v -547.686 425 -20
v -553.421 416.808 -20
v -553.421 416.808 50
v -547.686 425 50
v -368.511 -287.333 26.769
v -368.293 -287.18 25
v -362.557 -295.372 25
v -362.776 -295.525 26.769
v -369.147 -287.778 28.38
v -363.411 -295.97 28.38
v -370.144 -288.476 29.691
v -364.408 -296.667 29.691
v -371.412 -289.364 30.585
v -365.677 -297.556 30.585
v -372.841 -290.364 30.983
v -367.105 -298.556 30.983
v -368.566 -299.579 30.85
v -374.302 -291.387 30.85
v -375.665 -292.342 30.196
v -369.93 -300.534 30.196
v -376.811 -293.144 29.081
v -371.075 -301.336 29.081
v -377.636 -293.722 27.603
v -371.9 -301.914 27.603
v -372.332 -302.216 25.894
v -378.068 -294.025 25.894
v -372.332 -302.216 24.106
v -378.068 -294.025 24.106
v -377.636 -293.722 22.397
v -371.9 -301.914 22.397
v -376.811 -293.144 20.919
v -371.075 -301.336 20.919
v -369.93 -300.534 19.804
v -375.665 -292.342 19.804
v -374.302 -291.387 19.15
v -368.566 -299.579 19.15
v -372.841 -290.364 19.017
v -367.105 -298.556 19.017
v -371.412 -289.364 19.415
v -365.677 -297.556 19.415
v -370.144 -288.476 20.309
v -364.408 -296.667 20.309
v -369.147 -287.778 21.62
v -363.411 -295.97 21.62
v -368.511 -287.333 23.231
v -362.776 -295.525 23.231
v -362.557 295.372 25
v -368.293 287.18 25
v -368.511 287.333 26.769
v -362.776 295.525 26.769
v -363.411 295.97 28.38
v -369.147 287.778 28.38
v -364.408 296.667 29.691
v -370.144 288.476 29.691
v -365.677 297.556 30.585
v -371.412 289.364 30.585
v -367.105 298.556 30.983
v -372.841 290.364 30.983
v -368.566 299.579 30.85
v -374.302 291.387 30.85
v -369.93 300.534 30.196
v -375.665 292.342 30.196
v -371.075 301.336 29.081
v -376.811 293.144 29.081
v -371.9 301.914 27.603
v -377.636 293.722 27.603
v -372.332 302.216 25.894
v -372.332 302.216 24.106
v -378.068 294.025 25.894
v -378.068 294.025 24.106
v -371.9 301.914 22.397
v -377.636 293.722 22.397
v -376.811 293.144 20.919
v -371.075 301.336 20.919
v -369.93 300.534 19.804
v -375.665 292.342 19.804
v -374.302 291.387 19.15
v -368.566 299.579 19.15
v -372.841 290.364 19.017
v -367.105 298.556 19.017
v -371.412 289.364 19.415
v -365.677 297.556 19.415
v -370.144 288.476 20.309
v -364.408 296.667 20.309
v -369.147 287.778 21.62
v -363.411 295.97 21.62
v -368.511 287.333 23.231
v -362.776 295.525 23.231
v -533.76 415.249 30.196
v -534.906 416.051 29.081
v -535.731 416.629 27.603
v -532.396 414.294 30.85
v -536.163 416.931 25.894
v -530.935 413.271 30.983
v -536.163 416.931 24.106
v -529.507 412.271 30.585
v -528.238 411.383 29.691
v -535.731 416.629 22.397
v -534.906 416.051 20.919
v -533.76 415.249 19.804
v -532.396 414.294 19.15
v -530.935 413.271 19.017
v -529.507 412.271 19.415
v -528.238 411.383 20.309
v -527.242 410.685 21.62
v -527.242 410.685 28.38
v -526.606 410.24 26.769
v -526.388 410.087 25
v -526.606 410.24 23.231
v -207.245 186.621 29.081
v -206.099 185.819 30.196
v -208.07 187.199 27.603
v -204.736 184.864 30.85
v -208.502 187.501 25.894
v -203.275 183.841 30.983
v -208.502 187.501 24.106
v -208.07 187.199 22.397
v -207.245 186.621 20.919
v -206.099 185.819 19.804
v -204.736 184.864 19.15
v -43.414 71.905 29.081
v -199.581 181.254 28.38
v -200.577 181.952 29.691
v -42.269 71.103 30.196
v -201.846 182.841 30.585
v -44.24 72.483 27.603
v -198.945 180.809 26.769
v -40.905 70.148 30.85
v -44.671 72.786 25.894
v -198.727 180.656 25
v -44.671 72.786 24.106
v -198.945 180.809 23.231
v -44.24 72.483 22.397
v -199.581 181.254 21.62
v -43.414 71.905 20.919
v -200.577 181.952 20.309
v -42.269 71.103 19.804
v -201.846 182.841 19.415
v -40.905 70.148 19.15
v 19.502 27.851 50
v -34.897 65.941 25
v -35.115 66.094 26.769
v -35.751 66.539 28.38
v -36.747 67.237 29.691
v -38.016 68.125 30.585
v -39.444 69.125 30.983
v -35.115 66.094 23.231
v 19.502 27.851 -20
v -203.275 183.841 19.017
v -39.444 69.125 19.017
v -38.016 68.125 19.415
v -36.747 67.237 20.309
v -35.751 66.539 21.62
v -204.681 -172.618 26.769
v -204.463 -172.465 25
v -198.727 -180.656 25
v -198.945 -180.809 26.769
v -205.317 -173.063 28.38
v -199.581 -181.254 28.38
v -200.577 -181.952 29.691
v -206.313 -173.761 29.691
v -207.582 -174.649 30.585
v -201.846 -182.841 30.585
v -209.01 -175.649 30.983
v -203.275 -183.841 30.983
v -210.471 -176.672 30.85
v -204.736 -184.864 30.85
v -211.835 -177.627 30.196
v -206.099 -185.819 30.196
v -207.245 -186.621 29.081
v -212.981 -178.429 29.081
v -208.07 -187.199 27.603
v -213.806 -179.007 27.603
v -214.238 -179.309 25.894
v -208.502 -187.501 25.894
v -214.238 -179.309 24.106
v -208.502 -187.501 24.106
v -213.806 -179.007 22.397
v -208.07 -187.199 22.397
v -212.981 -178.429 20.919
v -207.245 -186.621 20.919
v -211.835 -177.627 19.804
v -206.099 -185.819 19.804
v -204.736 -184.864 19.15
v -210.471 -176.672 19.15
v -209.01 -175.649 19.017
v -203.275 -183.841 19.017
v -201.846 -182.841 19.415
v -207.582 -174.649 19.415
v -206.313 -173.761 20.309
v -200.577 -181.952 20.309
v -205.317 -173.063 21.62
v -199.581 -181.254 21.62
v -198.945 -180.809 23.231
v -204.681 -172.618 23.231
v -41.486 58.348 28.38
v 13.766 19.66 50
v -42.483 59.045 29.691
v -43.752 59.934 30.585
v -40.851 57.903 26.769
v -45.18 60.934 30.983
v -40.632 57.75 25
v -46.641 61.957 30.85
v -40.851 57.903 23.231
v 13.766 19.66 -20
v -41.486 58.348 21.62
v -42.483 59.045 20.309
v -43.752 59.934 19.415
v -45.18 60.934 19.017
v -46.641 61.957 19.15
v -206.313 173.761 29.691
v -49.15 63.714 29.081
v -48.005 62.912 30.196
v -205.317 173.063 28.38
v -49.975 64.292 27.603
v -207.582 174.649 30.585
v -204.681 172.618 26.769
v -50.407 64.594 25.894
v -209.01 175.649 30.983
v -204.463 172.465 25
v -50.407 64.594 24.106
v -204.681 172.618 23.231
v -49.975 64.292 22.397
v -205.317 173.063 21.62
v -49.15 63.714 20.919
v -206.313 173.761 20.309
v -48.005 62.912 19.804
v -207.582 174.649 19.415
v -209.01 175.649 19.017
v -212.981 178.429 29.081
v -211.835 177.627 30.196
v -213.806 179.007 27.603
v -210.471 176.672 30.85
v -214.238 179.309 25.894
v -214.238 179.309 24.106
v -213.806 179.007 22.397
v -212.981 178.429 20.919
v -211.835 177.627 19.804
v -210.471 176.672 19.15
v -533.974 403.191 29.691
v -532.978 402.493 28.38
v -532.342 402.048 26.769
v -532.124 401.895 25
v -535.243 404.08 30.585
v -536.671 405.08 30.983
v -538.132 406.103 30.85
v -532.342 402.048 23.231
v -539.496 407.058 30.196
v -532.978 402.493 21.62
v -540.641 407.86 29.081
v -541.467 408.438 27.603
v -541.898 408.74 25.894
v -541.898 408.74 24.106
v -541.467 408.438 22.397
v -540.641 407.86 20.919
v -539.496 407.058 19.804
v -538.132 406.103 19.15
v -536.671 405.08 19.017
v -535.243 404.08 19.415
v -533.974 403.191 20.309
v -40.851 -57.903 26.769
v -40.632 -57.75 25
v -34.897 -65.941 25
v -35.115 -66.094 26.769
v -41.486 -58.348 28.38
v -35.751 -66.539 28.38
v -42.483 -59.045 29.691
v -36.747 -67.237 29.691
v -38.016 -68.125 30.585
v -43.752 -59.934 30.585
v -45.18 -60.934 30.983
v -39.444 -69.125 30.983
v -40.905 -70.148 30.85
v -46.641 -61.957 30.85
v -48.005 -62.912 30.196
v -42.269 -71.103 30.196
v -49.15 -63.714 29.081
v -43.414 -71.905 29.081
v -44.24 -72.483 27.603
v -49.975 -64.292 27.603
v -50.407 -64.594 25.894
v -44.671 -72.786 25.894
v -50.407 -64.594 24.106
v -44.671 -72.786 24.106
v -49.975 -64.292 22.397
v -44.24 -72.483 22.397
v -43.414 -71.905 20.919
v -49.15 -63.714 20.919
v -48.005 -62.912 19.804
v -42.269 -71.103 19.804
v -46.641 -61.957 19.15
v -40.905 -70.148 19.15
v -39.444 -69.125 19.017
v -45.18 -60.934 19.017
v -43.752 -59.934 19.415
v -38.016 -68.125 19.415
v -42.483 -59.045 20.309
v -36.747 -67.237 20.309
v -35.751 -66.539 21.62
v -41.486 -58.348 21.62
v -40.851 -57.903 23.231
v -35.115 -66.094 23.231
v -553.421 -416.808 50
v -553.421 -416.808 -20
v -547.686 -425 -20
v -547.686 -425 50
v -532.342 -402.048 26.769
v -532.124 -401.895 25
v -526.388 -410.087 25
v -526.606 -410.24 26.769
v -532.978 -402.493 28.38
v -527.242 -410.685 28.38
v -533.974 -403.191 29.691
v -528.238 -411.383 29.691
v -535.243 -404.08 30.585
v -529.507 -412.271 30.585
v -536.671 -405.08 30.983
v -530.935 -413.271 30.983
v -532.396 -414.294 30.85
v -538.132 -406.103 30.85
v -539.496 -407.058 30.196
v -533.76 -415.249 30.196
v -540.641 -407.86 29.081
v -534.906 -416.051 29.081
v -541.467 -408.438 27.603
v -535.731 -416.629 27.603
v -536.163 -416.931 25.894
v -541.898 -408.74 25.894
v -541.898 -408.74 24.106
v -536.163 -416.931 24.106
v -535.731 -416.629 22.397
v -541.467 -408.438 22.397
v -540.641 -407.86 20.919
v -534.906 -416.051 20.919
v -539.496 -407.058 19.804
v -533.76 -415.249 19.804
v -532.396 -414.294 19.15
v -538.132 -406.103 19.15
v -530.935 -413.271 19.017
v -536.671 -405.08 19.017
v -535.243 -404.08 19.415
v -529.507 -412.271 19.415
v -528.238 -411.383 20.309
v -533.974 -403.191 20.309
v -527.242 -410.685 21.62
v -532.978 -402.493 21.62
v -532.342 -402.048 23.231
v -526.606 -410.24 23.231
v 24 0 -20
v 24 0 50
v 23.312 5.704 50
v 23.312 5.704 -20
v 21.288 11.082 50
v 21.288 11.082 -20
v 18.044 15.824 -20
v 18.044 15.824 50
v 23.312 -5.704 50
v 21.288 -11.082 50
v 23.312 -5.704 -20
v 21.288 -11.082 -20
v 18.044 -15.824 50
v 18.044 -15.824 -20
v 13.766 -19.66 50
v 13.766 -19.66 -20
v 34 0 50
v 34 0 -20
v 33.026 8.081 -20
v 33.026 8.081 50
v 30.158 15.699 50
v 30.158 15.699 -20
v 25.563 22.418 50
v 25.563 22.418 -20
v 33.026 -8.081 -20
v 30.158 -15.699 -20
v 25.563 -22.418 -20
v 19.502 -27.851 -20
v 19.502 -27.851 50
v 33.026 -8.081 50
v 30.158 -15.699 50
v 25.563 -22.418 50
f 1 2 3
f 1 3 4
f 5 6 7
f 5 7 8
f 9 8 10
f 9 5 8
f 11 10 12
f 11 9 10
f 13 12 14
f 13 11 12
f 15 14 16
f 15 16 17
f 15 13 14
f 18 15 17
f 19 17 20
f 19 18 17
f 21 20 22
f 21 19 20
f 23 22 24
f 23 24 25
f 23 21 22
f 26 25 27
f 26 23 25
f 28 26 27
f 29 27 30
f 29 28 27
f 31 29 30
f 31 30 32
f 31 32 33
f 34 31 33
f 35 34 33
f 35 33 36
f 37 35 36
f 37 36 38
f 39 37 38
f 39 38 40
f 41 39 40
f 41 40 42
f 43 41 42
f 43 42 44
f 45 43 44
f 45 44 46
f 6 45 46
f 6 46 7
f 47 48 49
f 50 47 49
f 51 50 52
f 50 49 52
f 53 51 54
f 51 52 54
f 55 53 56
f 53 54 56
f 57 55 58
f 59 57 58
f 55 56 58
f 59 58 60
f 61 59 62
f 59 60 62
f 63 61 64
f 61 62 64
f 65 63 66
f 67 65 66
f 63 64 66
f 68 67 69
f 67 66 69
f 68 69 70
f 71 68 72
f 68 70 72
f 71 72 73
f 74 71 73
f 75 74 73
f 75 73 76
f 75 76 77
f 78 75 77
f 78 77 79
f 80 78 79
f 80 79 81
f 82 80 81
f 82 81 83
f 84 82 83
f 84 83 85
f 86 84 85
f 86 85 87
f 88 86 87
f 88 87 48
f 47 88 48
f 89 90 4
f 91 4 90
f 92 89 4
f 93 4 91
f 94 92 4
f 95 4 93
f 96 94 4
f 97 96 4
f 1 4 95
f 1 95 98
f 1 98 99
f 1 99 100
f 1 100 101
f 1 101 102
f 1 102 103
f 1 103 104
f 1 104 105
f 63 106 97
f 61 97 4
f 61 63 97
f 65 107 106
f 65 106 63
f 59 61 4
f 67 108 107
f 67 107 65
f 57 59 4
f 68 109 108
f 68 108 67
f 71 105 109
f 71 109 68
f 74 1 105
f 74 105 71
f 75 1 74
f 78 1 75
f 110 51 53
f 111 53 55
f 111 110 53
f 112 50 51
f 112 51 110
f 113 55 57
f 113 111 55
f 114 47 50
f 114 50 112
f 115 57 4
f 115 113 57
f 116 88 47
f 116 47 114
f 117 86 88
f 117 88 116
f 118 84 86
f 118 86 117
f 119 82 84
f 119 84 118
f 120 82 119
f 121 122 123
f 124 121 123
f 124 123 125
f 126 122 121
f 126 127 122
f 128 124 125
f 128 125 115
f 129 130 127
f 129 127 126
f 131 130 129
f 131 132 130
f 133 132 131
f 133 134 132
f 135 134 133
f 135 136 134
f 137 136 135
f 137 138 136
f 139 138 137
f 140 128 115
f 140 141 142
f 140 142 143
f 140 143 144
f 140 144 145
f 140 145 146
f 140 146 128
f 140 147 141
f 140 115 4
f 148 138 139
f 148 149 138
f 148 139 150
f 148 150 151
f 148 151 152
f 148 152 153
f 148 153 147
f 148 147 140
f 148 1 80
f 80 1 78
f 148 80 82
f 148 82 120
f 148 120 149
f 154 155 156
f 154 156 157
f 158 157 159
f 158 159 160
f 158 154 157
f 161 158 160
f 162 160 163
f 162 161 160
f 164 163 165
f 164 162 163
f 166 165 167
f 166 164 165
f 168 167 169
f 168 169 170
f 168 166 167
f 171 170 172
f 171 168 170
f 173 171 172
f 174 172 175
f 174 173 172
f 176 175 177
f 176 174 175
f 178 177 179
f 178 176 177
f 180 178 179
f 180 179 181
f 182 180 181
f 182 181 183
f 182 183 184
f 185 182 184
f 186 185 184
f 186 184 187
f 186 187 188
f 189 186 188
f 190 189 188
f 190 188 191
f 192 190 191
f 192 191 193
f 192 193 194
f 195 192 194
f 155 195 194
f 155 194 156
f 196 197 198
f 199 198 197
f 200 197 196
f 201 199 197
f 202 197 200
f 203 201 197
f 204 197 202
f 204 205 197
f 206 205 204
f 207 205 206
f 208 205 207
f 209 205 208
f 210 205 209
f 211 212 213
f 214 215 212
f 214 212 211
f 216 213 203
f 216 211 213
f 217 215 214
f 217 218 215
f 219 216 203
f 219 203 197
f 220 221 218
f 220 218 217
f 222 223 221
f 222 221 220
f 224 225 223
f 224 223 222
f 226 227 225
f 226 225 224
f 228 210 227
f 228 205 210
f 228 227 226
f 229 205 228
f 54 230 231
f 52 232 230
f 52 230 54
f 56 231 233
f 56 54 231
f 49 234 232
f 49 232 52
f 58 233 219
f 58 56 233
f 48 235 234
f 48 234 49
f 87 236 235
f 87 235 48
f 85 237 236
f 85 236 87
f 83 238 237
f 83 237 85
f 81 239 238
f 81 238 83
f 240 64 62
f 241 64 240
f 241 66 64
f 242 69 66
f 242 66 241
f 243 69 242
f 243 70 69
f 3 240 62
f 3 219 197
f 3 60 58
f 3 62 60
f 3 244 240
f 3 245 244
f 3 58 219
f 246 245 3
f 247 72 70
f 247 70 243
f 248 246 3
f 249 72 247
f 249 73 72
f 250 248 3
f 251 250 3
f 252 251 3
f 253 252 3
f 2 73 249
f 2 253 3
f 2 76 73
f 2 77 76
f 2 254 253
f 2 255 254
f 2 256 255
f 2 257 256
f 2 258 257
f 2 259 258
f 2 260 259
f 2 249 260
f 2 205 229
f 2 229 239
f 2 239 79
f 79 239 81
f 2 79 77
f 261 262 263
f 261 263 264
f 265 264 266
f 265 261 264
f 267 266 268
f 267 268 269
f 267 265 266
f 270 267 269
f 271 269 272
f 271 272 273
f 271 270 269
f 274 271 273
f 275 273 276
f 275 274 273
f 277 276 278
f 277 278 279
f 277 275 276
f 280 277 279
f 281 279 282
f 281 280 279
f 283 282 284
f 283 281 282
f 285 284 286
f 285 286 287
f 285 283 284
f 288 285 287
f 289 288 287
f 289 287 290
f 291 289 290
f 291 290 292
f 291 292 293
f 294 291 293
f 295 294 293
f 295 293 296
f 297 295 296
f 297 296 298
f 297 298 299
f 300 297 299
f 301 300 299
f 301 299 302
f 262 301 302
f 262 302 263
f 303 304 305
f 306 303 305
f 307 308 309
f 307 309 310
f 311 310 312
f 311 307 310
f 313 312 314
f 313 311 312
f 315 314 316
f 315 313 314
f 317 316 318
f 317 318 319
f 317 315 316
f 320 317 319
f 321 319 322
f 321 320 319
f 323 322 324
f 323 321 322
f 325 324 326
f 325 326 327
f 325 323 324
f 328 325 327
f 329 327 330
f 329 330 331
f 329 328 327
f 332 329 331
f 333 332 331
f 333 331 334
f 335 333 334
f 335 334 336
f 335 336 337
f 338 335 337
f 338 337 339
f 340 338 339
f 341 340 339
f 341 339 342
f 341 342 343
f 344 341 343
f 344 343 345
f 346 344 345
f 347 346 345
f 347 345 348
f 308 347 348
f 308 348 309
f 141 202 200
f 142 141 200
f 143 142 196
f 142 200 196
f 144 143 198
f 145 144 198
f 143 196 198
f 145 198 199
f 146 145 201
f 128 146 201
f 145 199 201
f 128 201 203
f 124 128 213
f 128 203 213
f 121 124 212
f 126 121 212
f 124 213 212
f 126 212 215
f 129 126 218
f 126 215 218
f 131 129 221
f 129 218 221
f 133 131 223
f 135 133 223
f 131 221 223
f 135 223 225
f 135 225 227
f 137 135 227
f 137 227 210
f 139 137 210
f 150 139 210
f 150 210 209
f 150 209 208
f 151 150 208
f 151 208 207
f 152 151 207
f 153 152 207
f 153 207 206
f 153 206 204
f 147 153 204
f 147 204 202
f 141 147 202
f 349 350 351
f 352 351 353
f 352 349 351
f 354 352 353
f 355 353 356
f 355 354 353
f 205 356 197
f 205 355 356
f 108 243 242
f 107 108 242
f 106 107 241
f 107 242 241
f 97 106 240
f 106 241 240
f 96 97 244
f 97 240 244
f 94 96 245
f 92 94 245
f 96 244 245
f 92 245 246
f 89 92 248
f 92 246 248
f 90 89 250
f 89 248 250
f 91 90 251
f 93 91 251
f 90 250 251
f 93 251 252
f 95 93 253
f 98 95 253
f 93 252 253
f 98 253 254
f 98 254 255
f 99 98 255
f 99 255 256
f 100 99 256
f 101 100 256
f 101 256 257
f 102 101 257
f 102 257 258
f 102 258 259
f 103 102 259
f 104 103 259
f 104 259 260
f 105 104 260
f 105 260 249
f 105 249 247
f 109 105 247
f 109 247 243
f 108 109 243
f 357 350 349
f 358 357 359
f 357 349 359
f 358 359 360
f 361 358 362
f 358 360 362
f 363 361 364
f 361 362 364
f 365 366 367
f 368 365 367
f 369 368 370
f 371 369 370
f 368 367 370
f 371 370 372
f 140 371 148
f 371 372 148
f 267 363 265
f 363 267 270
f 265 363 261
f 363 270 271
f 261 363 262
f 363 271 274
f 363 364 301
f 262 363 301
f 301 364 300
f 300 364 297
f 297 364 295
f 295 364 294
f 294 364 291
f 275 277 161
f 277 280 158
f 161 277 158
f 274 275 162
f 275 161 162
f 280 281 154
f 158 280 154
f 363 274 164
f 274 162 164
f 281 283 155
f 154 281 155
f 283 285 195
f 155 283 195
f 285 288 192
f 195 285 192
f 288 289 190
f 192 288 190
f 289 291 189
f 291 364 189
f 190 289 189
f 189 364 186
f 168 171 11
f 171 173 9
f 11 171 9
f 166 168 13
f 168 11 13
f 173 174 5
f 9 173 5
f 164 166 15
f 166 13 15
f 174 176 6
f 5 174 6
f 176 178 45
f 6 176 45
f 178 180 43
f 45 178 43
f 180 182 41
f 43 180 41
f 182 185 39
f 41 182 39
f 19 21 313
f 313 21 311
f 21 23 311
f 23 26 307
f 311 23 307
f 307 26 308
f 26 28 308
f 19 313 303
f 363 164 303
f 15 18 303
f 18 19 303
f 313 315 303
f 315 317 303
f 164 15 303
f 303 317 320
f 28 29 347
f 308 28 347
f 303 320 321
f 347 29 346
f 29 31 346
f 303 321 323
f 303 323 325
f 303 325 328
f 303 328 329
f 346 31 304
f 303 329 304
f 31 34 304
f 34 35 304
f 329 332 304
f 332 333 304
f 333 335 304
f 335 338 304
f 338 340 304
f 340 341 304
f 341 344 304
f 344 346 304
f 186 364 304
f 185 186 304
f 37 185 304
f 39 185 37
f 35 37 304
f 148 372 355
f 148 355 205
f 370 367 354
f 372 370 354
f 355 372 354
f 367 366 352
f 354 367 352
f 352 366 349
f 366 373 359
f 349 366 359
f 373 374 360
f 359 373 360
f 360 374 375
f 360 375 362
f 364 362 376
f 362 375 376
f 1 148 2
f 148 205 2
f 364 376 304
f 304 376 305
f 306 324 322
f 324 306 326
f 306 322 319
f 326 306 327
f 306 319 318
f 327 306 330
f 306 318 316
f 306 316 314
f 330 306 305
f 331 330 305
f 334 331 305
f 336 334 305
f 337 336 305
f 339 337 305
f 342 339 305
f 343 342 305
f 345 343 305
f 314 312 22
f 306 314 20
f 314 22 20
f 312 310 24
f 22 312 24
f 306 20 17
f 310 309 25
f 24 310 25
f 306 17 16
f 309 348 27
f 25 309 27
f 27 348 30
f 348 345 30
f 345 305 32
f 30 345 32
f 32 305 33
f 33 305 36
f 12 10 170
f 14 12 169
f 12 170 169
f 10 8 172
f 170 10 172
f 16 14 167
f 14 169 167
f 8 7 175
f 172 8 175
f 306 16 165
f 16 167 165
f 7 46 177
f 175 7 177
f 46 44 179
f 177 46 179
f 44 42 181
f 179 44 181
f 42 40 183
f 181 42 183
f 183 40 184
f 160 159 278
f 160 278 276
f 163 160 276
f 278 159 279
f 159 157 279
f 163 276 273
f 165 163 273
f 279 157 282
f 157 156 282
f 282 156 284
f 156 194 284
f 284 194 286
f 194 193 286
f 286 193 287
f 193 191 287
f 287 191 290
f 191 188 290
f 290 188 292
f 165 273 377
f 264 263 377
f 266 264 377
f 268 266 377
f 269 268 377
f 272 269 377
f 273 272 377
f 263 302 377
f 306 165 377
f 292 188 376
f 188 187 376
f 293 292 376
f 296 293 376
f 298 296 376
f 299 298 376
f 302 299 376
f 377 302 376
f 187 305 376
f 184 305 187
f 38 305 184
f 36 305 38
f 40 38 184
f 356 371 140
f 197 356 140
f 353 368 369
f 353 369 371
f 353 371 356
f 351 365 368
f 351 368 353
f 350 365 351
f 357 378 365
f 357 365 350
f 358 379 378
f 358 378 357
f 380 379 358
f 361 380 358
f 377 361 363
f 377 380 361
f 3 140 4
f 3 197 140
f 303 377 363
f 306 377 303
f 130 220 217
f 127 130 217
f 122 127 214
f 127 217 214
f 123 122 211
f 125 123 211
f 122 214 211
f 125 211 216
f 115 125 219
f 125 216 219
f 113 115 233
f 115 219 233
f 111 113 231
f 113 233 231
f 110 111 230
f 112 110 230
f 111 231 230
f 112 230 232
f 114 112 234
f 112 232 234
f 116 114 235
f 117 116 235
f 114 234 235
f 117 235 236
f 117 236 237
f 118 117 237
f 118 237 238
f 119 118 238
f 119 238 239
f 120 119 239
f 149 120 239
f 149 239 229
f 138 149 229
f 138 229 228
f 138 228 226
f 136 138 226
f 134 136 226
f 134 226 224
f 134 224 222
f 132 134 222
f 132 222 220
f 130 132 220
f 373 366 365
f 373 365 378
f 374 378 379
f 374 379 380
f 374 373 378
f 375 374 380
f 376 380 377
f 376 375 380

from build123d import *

# Parameters (mm, degrees)
PAD002_DEPTH           = 70
SKETCH006_R            = 6
POCKET002_DEPTH        = 30
SKETCH007_R            = 6
POCKET003_DEPTH        = 343.6422176588
LINEARPATTERN001_COUNT = 4
LINEARPATTERN001_PITCH = 200


with BuildPart() as part:
    # Sketch004 → Pad002 (new body)
    with BuildSketch(Plane.XY):
        with BuildLine():
            Line((-547.6857118143, 425), (19.5015988359, 27.8511695058))
            ThreePointArc((34, 0), (30.1583683281, 15.69945285), (19.5015988359, 27.8511695058))
            Line((24, 0), (34, 0))
            ThreePointArc((24, 0), (21.2882599963, 11.0819667176), (13.7658344724, 19.6596490629))
            Line((13.7658344724, 19.6596490629), (-553.4214761778, 416.8084795571))
            Line((-553.4214761778, 416.8084795571), (-547.6857118143, 425))
        make_face()
    extrude(amount=PAD002_DEPTH)

    # Sketch006 → Pocket002 (cut)
    with BuildSketch(Plane(origin=(0, 126.75, 0), x_dir=(-1, 0, 0), z_dir=(0, 1, 0))):
        with Locations((26.7405688034, 25.24131)):
            Circle(SKETCH006_R)
    extrude(amount=-POCKET002_DEPTH, mode=Mode.SUBTRACT)

    # Sketch007 (on Face2 of Pocket002) → Pocket003 (cut, through all)
    with BuildSketch(Plane(origin=(13.7658344724, 19.6596490629, 0), x_dir=(0.8191520443, -0.5735764364, 0), z_dir=(-0.5735764364, -0.8191520443, 0))):
        with Locations((-672.4078559097, 45)):
            Circle(SKETCH007_R)
    pocket003 = extrude(amount=-POCKET003_DEPTH, mode=Mode.SUBTRACT)

    # LinearPattern001: Pocket003 ×4
    with Locations(*[Vector(0.8191520443, -0.5735764364, 0) * (i * LINEARPATTERN001_PITCH) for i in range(1, LINEARPATTERN001_COUNT)]):
        add(pocket003, mode=Mode.SUBTRACT)

    # Mirrored001: part across XZ


with BuildPart() as part_1:
    add(part.part)
    add(part.part.mirror(Plane.XZ))


with BuildPart() as part_2:
    # Body001 placement: moved
    add(part_1.part.moved(Location((0, 0, -20))))


solid = part_2.part
